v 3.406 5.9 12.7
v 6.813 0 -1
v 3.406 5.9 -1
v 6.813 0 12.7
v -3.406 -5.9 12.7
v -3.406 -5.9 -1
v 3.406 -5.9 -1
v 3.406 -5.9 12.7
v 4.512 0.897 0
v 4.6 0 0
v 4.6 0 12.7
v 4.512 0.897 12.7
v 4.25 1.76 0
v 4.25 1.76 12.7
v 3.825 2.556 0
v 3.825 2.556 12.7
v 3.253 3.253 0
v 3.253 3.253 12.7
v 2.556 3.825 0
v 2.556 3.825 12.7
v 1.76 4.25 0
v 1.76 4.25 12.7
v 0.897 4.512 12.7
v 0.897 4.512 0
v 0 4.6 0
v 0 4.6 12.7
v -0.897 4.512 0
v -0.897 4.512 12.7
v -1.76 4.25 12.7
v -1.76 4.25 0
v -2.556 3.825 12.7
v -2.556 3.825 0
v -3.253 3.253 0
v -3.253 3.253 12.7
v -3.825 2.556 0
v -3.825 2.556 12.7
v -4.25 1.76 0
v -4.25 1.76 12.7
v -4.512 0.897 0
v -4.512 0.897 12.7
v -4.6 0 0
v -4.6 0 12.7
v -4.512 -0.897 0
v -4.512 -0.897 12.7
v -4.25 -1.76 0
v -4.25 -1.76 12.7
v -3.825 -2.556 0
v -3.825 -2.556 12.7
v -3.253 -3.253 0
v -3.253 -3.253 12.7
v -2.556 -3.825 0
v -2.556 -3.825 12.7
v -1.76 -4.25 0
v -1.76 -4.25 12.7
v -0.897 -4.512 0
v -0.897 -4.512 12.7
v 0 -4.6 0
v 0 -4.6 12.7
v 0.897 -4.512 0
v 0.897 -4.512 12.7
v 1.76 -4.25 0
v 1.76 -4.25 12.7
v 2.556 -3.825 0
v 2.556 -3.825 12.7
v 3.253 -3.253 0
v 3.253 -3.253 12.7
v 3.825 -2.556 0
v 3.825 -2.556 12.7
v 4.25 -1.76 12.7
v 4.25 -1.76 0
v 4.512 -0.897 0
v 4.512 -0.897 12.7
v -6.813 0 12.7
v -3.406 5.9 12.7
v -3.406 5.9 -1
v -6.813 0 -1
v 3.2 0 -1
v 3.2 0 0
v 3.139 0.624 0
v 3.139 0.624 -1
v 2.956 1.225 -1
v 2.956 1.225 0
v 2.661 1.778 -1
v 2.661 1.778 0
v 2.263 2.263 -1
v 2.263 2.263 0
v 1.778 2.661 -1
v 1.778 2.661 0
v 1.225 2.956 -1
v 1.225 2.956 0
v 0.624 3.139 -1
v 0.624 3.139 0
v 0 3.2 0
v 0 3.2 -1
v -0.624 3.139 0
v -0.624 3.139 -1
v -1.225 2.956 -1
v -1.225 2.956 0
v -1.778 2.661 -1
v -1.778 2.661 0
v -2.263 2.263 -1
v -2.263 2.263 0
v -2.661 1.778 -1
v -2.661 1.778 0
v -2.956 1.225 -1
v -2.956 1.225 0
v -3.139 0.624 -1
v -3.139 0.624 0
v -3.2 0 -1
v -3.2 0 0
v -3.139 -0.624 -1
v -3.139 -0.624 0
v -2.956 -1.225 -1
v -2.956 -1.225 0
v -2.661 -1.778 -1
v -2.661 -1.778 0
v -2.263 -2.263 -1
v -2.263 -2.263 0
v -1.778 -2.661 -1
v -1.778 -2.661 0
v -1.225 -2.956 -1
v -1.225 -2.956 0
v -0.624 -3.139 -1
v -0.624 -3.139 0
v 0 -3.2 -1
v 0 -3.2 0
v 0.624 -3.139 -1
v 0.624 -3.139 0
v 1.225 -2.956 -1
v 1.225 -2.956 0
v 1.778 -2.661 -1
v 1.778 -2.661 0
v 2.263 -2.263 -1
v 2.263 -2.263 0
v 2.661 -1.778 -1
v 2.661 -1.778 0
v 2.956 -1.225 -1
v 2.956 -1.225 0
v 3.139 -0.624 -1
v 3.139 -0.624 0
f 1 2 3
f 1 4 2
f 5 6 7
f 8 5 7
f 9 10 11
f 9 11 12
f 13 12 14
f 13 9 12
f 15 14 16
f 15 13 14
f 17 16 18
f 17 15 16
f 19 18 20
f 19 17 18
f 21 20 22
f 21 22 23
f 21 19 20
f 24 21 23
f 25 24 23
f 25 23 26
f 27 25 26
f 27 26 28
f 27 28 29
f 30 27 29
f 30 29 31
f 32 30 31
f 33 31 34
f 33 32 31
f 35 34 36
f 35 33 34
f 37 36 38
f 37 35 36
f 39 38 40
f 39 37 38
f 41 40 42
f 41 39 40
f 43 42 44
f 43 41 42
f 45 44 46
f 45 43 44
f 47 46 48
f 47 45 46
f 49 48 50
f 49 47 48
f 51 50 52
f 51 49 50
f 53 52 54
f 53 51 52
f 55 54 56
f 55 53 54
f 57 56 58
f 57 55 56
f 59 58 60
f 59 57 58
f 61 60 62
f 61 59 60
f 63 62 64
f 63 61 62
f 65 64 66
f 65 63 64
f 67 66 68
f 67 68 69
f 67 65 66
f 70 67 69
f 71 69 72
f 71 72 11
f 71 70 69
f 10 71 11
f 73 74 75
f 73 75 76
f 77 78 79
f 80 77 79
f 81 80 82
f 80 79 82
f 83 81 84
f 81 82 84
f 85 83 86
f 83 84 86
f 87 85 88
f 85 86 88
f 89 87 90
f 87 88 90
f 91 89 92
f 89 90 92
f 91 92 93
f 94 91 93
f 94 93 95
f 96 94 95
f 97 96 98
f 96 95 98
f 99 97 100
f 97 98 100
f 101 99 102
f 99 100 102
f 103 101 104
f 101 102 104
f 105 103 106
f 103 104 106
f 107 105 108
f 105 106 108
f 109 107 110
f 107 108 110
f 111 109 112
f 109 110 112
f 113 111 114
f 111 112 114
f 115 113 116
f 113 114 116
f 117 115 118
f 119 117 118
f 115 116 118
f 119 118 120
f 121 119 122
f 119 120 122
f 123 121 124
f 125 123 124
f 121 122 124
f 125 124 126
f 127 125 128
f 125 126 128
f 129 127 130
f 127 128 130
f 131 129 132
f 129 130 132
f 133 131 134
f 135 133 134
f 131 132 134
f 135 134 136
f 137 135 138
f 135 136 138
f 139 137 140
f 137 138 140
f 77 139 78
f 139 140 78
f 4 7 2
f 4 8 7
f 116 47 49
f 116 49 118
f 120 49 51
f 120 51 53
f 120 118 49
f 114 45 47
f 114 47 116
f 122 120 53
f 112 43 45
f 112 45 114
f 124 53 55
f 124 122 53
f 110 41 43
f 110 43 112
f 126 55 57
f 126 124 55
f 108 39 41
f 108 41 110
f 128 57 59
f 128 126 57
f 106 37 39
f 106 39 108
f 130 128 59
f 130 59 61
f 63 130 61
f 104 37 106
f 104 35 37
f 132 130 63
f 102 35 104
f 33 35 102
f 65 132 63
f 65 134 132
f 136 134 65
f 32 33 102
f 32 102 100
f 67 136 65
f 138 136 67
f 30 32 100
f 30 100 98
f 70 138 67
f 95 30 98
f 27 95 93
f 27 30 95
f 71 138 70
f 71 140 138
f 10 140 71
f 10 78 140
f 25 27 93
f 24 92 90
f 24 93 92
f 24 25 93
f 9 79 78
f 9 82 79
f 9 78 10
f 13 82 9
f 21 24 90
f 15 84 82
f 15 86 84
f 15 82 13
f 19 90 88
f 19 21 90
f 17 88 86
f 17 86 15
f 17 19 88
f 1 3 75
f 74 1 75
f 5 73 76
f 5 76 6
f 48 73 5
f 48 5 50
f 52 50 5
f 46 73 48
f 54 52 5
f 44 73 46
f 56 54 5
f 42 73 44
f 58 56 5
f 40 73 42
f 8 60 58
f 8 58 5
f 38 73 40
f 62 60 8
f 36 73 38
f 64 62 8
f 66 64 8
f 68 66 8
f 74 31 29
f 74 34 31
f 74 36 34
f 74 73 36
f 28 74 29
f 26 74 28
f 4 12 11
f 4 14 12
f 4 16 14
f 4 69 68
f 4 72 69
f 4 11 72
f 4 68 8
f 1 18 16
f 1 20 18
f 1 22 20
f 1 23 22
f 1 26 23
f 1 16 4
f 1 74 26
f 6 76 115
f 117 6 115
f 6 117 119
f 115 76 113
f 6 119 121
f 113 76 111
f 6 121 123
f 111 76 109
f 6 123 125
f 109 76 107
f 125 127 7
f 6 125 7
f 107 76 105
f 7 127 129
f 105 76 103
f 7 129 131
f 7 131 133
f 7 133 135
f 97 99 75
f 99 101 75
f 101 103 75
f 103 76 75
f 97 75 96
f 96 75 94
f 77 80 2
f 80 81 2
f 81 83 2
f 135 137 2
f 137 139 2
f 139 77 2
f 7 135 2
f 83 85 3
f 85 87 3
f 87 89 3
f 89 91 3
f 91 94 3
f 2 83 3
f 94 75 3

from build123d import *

# Parameters (mm, degrees)
F0_R     = 4.6
F1_DEPTH = 12.7
F0_R_2   = 3.2
F2_DEPTH = 1


with BuildPart() as f1:
    # F0 (on Top) → F1 (new body)
    with BuildSketch(Plane.XY):
        Polygon((3.4063665882, 5.9), (-3.4063665882, 5.9), (-6.8127331764, 0), (-3.4063665882, -5.9), (3.4063665882, -5.9), (6.8127331764, 0), align=None)
        Circle(F0_R, mode=Mode.SUBTRACT)
    extrude(amount=F1_DEPTH)

    # F0 (on Top) → F2 (join)
    with BuildSketch(Plane.XY):
        Polygon((3.4063665882, 5.9), (-3.4063665882, 5.9), (-6.8127331764, 0), (-3.4063665882, -5.9), (3.4063665882, -5.9), (6.8127331764, 0), align=None)
        Circle(F0_R, mode=Mode.SUBTRACT)
        Circle(F0_R)
        Circle(F0_R_2, mode=Mode.SUBTRACT)
    extrude(amount=-F2_DEPTH)


solid = f1.part
